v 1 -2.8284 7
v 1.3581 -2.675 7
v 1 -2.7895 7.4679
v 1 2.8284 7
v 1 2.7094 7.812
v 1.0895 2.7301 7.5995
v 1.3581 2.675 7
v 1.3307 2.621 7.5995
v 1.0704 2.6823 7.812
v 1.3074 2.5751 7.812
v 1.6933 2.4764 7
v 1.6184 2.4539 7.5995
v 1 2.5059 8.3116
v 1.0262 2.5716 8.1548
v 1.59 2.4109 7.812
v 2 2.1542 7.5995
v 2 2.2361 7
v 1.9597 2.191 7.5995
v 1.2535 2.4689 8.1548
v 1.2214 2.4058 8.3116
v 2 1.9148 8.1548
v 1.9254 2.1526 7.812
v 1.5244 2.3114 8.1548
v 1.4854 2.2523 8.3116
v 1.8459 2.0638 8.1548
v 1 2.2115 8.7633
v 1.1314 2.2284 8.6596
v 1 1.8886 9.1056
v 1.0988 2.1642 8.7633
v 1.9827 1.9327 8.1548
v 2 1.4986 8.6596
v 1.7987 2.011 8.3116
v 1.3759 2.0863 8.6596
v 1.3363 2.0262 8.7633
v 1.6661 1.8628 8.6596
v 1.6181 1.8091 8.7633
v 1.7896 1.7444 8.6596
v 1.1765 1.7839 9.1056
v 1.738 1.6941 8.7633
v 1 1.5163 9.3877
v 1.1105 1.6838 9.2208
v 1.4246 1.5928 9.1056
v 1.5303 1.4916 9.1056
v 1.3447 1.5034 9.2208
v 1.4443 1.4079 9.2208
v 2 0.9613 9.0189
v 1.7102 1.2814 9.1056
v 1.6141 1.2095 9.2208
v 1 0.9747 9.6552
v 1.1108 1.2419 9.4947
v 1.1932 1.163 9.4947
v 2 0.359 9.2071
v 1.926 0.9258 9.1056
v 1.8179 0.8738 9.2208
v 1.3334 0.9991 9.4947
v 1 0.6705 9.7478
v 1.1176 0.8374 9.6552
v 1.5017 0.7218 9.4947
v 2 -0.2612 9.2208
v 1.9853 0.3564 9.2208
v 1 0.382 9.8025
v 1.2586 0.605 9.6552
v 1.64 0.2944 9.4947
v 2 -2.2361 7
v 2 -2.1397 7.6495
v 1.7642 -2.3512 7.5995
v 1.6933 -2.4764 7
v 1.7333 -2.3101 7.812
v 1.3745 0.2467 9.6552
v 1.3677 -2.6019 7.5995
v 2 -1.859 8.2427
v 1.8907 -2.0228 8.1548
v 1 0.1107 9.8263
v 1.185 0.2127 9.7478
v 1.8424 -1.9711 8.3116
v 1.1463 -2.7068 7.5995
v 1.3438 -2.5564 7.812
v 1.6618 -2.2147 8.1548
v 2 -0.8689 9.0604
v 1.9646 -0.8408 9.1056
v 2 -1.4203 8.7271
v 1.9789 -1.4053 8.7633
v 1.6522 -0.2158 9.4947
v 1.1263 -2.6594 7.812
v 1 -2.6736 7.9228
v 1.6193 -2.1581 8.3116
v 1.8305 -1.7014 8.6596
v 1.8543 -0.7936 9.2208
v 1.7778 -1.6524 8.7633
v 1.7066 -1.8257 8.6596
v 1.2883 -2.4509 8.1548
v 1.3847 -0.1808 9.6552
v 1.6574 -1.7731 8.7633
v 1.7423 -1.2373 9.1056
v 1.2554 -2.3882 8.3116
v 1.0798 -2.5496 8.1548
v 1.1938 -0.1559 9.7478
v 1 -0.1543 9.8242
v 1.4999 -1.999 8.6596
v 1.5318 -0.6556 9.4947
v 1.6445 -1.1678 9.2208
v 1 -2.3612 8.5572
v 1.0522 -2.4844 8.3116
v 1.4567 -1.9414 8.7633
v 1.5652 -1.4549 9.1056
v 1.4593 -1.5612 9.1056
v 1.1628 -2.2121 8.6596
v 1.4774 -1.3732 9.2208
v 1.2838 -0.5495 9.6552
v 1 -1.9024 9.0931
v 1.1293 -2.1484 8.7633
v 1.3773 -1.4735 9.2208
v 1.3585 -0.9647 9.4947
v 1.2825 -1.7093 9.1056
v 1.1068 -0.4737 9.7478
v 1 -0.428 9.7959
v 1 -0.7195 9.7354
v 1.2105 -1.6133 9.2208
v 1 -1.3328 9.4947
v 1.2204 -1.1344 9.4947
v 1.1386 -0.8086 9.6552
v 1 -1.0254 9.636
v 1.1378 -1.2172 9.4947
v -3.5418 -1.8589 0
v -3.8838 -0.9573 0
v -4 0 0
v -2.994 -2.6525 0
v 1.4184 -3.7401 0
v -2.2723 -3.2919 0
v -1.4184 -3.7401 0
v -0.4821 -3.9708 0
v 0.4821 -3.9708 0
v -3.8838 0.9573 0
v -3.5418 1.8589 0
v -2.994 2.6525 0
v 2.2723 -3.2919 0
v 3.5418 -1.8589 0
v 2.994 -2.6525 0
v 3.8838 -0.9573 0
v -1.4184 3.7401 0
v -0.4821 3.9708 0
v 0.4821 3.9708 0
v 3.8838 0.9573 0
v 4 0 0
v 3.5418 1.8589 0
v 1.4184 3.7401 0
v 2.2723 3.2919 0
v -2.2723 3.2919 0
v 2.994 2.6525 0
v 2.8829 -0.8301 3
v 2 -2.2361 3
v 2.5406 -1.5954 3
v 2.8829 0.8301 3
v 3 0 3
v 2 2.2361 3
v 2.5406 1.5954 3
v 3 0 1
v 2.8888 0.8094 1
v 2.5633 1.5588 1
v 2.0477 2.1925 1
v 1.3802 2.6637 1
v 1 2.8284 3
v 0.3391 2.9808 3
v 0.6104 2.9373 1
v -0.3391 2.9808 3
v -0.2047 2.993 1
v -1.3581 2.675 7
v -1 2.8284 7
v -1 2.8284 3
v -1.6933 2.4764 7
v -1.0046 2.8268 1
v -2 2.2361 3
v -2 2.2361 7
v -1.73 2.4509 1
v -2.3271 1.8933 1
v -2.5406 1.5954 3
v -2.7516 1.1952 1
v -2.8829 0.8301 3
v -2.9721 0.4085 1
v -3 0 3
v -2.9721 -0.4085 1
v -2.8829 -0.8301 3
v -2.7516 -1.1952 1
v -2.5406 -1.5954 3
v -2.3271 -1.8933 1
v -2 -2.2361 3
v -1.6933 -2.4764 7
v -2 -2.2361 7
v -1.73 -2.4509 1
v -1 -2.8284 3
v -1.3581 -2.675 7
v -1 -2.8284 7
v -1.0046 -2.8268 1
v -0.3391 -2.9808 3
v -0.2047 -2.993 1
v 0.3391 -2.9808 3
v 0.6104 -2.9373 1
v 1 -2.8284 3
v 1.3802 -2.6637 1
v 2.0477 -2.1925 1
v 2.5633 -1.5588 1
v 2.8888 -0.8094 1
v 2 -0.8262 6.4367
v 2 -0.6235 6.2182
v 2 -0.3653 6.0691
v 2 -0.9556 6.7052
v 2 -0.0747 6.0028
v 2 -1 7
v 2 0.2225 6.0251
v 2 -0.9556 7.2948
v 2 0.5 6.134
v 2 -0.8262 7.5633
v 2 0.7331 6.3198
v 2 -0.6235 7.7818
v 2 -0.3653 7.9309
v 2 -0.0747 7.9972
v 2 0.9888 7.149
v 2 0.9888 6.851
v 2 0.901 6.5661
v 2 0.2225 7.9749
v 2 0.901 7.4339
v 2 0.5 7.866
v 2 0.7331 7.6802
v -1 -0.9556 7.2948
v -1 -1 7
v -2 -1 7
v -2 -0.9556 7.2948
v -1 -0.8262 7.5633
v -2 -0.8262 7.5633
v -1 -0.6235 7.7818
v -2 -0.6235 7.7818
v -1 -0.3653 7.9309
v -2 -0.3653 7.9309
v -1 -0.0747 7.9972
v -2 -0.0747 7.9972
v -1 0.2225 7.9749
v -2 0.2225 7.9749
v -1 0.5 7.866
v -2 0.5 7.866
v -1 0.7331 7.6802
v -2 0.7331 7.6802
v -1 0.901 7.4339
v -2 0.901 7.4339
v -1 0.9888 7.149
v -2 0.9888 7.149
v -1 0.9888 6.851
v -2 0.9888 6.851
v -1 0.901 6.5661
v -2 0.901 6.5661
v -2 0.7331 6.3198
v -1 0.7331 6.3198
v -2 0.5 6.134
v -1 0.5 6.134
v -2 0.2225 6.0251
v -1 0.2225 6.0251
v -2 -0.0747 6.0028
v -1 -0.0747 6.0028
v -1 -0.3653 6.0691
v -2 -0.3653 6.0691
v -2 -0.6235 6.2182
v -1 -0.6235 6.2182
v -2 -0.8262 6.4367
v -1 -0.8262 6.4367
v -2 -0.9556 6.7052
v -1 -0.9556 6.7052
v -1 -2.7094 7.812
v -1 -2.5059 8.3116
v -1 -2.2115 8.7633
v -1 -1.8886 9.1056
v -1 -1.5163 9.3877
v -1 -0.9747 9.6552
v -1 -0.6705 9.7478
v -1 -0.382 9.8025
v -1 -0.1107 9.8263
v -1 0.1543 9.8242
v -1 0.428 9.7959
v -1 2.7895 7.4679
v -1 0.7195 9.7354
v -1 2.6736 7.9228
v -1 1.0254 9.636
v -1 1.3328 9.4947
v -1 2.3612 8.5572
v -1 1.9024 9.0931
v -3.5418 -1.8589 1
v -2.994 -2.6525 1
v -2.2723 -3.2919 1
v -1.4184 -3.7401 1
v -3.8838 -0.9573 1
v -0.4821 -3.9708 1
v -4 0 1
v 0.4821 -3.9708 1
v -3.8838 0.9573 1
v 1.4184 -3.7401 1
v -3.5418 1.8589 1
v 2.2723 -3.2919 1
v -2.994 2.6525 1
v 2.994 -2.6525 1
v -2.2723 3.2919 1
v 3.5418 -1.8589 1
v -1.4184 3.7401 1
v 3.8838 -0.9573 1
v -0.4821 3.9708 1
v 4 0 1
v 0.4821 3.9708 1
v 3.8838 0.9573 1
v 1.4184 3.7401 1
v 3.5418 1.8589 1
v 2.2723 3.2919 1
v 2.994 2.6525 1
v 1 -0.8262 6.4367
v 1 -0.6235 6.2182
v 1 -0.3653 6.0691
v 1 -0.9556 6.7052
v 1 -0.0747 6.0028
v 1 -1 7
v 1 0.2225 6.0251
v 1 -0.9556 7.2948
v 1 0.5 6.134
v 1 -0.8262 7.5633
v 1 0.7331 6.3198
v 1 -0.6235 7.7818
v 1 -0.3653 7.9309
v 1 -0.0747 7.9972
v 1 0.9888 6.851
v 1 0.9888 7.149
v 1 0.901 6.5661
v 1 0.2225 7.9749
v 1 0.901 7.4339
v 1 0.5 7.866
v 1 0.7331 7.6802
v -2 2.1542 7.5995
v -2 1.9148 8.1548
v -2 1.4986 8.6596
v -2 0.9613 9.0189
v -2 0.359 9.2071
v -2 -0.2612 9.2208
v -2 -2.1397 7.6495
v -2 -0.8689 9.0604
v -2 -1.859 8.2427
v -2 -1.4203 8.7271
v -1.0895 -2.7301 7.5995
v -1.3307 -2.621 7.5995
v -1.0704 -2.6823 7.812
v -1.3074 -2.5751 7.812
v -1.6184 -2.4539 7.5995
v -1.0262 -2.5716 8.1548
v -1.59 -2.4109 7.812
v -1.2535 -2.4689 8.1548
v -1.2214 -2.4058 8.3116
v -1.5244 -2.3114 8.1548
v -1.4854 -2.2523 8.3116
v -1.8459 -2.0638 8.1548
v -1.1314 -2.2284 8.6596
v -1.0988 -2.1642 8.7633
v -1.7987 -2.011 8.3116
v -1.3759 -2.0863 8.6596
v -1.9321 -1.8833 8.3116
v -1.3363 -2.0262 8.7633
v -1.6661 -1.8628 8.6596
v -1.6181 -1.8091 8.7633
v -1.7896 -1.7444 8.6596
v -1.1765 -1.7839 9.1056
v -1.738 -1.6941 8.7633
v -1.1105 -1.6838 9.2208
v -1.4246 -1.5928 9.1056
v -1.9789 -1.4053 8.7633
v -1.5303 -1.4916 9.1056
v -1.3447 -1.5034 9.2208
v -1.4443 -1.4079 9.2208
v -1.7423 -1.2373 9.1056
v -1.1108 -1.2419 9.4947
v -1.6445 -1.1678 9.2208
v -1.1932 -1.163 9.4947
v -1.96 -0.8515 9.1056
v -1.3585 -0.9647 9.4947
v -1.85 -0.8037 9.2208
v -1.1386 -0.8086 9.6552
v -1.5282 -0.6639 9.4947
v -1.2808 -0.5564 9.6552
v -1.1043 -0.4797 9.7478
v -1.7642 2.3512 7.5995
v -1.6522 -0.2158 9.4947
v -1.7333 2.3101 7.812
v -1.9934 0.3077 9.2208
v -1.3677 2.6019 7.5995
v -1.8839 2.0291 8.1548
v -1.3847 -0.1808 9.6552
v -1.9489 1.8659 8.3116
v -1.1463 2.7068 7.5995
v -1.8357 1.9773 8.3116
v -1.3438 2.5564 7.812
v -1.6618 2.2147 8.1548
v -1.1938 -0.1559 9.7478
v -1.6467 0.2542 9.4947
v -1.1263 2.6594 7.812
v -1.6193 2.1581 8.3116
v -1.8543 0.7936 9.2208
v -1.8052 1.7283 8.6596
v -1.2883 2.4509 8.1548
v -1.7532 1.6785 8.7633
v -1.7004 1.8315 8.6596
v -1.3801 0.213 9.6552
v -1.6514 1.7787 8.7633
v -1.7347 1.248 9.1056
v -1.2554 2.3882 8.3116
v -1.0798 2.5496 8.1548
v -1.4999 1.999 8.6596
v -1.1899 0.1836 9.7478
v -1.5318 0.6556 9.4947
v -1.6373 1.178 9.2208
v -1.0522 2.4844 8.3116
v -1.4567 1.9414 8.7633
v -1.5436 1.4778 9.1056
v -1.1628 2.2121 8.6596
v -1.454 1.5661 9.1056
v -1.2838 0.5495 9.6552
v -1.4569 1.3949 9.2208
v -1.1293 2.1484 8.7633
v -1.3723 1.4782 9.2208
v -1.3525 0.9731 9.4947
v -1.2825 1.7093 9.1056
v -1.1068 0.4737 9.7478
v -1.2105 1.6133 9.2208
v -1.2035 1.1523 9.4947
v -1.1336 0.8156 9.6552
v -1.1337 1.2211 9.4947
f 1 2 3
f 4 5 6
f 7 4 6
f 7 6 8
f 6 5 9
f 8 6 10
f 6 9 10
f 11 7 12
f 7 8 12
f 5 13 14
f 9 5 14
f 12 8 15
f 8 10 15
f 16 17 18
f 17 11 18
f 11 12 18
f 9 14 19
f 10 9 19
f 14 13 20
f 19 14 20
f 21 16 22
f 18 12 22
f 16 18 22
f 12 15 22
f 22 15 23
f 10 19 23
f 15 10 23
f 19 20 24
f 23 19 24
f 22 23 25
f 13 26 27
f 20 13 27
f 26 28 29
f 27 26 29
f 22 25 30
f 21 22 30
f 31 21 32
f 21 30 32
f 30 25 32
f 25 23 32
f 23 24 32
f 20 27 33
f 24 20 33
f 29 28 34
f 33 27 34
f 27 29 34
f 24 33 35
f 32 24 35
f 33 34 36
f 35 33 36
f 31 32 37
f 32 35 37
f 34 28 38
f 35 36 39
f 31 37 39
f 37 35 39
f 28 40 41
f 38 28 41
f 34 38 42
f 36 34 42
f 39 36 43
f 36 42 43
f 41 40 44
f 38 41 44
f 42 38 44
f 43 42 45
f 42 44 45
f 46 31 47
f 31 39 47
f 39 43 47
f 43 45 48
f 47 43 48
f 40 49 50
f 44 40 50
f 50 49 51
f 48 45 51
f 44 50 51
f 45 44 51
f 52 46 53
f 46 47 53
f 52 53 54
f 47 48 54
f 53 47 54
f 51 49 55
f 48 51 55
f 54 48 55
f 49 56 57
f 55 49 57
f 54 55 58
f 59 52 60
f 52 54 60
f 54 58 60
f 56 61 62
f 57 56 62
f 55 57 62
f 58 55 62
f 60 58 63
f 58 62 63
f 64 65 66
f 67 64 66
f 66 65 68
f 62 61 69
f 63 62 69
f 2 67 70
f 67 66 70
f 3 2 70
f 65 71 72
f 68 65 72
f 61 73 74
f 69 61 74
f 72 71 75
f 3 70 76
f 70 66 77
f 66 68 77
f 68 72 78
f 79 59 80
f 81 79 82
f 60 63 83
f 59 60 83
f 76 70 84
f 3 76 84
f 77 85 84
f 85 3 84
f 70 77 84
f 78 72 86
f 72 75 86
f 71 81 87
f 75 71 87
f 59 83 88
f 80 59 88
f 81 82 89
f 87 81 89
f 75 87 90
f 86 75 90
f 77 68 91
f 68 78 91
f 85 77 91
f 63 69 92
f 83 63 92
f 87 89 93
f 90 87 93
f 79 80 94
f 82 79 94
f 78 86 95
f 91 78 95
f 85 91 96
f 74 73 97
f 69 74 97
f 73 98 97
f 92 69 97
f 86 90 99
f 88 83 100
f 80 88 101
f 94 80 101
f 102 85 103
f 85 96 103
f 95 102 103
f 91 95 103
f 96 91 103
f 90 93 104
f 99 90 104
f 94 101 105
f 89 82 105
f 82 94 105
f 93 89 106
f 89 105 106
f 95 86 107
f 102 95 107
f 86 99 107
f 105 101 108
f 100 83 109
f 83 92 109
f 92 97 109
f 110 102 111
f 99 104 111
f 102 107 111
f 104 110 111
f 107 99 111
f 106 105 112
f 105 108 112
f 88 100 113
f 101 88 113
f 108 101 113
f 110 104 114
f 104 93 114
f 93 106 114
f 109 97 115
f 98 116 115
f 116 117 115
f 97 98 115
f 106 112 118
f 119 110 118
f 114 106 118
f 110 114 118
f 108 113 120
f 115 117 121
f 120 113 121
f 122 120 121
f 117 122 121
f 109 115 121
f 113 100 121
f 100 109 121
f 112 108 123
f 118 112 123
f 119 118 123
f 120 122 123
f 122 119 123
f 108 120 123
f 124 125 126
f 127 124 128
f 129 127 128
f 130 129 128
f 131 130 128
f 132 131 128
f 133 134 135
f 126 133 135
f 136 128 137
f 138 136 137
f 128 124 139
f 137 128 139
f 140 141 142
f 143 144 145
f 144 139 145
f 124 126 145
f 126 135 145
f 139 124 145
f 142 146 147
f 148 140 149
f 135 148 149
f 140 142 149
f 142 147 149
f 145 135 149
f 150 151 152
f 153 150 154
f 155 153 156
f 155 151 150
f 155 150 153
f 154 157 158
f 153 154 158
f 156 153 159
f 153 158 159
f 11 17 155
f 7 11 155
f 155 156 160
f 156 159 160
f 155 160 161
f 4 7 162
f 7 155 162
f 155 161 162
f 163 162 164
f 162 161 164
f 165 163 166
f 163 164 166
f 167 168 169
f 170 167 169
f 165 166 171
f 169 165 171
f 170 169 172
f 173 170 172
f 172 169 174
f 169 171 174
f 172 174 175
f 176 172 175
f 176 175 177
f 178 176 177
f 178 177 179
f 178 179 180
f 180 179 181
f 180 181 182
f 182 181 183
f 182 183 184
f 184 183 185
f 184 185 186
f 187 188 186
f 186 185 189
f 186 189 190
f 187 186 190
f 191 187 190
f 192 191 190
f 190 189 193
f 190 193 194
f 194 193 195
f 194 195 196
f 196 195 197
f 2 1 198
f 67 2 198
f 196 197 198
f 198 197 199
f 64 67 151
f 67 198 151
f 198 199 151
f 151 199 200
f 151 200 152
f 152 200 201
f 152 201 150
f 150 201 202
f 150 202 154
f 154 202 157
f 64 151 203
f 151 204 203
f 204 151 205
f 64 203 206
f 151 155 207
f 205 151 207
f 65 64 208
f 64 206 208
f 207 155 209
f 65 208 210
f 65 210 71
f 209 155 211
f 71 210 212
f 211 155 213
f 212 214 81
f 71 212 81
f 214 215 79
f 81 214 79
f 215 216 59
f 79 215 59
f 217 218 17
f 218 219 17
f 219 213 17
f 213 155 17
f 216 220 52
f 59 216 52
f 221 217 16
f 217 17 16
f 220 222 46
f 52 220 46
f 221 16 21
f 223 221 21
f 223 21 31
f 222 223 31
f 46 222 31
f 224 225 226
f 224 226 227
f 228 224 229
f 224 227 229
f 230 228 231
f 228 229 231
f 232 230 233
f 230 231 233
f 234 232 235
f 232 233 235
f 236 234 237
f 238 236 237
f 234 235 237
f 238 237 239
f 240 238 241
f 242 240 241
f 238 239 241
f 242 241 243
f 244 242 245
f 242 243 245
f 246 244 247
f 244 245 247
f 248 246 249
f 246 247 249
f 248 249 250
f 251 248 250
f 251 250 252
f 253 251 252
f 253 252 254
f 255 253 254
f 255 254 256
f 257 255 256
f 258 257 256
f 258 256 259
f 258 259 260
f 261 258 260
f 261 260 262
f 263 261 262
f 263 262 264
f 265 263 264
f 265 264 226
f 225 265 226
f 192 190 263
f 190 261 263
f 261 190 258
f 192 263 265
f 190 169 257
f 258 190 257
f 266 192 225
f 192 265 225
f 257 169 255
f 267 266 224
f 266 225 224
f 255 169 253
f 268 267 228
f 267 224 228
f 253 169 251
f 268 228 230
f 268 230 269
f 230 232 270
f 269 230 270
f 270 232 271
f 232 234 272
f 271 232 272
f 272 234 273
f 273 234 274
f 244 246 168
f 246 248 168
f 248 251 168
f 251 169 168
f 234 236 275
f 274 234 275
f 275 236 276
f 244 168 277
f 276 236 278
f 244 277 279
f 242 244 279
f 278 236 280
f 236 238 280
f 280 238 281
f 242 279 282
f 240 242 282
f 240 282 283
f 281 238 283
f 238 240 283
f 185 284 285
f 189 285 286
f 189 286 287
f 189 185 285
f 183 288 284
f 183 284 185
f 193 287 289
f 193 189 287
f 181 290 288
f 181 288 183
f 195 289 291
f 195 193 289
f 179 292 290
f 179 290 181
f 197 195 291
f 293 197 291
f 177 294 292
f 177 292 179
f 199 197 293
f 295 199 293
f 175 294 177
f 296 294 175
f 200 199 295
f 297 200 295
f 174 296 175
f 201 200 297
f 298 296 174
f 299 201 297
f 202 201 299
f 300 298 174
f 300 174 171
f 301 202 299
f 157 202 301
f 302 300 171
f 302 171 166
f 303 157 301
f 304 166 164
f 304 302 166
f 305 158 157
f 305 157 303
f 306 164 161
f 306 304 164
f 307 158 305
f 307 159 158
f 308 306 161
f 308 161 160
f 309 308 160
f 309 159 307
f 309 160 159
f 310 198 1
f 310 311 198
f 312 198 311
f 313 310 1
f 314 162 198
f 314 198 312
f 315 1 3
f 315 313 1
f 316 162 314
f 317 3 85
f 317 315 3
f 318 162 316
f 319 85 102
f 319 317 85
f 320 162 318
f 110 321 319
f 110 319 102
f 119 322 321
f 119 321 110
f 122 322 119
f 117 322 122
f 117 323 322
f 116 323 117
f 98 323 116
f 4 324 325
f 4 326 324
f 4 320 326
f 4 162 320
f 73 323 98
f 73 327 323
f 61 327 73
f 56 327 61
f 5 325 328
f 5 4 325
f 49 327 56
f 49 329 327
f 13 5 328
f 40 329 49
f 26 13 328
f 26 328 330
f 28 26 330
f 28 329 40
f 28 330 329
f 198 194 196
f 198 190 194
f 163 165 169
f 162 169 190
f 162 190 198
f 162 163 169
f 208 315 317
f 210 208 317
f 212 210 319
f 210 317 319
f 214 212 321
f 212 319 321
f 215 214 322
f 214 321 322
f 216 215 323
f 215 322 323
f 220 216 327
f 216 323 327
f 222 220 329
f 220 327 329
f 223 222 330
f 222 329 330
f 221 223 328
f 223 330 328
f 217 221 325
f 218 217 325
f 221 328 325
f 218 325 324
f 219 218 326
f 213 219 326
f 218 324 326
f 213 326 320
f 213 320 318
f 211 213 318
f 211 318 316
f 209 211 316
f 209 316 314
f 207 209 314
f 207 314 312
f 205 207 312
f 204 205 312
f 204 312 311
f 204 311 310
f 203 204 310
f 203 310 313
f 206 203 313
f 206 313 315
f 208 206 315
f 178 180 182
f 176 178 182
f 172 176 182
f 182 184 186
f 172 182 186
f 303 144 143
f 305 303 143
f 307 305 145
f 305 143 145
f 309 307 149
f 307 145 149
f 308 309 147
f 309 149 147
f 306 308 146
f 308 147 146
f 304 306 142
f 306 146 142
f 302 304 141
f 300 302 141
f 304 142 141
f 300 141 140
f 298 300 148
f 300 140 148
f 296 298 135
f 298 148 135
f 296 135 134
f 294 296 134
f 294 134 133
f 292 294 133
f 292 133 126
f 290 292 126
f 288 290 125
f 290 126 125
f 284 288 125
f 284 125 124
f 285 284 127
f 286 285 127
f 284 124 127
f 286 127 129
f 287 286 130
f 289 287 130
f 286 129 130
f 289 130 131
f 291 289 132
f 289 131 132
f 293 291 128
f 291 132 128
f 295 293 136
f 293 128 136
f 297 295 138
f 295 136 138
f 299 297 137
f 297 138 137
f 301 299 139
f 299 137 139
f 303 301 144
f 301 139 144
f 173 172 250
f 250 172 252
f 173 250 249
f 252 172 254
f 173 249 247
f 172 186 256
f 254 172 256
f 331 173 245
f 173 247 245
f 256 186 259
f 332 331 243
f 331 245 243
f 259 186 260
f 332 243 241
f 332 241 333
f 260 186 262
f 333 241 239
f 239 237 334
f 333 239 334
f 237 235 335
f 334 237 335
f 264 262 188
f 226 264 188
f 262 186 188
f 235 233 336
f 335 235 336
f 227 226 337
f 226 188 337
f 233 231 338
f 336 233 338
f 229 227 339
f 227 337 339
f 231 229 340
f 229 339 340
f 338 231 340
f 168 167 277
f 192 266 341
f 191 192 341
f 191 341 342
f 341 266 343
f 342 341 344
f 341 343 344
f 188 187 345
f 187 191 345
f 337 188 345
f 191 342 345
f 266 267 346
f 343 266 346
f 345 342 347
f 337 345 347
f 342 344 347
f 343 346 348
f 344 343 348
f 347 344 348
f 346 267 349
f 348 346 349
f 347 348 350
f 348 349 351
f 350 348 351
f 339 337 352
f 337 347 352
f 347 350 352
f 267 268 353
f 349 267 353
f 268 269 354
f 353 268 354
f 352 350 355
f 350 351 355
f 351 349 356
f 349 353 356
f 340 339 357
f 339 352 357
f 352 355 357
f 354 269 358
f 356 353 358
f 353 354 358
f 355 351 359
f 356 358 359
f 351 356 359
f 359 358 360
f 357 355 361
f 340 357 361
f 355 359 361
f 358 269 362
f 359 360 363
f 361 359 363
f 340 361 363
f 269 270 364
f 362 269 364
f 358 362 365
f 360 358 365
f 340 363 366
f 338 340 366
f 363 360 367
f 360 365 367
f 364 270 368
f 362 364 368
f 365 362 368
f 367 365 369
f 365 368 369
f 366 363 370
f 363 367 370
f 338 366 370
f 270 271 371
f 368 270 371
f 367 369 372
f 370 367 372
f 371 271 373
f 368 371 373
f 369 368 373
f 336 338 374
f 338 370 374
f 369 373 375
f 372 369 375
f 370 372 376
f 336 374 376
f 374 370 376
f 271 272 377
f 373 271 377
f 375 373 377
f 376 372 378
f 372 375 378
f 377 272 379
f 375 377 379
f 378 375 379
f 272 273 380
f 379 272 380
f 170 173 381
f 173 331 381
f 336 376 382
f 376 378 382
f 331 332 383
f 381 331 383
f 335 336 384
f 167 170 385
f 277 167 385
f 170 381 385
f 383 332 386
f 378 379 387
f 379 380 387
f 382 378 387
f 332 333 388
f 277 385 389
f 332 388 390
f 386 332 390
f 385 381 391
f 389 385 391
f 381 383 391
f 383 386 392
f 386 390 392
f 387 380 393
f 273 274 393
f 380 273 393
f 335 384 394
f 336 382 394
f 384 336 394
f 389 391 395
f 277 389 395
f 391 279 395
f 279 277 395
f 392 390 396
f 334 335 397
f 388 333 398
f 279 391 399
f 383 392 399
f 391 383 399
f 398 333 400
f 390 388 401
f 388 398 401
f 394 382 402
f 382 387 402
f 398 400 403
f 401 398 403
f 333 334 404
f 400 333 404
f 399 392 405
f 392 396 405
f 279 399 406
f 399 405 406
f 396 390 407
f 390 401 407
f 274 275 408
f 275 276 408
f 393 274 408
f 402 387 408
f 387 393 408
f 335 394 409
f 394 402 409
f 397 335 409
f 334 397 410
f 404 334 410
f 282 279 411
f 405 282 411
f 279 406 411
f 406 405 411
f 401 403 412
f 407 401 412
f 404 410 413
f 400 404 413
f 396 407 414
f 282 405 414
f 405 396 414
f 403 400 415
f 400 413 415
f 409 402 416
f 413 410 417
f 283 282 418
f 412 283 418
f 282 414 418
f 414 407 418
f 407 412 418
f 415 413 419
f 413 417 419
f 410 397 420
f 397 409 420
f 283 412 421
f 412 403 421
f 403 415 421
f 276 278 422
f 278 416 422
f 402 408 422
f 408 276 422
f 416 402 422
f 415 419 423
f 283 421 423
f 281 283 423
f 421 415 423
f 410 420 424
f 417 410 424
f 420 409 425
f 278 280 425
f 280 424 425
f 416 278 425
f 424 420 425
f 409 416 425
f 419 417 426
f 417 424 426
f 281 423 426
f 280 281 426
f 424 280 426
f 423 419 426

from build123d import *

# Parameters (mm, degrees)
F0_R     = 4
F1_DEPTH = 1
F2_R     = 3
F3_DEPTH = 6
F6_W     = 2
F6_H     = 12.68074
F6_W_2   = 1.971088
F6_H_2   = 12.97379
F6_W_3   = 1.876695
F6_H_3   = 11.885081
F7_DEPTH = 12.5
F8_R     = 1
F9_DEPTH = 6.001


with BuildPart() as f1:
    # F0 (on Top) → F1 (new body)
    with BuildSketch(Plane.XY):
        Circle(F0_R)
    extrude(amount=F1_DEPTH)

    # F2 (on face) → F3 (join)
    with BuildSketch(Plane.XY.offset(1)):
        Circle(F2_R)
    extrude(amount=F3_DEPTH)

    # F4 (on Front) → F5 (revolve)
    with BuildSketch(Plane.XZ):
        with BuildLine():
            Line((0, 7), (3, 7))
            ThreePointArc((3, 7), (2.12132, 9.12132), (0, 10))
            Line((0, 10), (0, 7))
        make_face()
    revolve(axis=Axis((0, 0, 8.5), (0, 0, -1)))

    # F6 (on Front) → F7 (cut, symmetric)
    with BuildSketch(Plane.XZ):
        with Locations((0, 9.34037)):
            Rectangle(F6_W, F6_H)
        with Locations((2.985544, 9.486895)):
            Rectangle(F6_W_2, F6_H_2)
        with Locations((-2.938347, 8.94254)):
            Rectangle(F6_W_3, F6_H_3)
    extrude(amount=F7_DEPTH, both=True, mode=Mode.SUBTRACT)

    # F8 (on face) → F9 (cut, through all)
    with BuildSketch(Plane(origin=(-2, 0, 0), x_dir=(0, -1, 0), z_dir=(-1, 0, 0))):
        with Locations((0, 7)):
            Circle(F8_R)
    extrude(amount=-F9_DEPTH, mode=Mode.SUBTRACT)


solid = f1.part
